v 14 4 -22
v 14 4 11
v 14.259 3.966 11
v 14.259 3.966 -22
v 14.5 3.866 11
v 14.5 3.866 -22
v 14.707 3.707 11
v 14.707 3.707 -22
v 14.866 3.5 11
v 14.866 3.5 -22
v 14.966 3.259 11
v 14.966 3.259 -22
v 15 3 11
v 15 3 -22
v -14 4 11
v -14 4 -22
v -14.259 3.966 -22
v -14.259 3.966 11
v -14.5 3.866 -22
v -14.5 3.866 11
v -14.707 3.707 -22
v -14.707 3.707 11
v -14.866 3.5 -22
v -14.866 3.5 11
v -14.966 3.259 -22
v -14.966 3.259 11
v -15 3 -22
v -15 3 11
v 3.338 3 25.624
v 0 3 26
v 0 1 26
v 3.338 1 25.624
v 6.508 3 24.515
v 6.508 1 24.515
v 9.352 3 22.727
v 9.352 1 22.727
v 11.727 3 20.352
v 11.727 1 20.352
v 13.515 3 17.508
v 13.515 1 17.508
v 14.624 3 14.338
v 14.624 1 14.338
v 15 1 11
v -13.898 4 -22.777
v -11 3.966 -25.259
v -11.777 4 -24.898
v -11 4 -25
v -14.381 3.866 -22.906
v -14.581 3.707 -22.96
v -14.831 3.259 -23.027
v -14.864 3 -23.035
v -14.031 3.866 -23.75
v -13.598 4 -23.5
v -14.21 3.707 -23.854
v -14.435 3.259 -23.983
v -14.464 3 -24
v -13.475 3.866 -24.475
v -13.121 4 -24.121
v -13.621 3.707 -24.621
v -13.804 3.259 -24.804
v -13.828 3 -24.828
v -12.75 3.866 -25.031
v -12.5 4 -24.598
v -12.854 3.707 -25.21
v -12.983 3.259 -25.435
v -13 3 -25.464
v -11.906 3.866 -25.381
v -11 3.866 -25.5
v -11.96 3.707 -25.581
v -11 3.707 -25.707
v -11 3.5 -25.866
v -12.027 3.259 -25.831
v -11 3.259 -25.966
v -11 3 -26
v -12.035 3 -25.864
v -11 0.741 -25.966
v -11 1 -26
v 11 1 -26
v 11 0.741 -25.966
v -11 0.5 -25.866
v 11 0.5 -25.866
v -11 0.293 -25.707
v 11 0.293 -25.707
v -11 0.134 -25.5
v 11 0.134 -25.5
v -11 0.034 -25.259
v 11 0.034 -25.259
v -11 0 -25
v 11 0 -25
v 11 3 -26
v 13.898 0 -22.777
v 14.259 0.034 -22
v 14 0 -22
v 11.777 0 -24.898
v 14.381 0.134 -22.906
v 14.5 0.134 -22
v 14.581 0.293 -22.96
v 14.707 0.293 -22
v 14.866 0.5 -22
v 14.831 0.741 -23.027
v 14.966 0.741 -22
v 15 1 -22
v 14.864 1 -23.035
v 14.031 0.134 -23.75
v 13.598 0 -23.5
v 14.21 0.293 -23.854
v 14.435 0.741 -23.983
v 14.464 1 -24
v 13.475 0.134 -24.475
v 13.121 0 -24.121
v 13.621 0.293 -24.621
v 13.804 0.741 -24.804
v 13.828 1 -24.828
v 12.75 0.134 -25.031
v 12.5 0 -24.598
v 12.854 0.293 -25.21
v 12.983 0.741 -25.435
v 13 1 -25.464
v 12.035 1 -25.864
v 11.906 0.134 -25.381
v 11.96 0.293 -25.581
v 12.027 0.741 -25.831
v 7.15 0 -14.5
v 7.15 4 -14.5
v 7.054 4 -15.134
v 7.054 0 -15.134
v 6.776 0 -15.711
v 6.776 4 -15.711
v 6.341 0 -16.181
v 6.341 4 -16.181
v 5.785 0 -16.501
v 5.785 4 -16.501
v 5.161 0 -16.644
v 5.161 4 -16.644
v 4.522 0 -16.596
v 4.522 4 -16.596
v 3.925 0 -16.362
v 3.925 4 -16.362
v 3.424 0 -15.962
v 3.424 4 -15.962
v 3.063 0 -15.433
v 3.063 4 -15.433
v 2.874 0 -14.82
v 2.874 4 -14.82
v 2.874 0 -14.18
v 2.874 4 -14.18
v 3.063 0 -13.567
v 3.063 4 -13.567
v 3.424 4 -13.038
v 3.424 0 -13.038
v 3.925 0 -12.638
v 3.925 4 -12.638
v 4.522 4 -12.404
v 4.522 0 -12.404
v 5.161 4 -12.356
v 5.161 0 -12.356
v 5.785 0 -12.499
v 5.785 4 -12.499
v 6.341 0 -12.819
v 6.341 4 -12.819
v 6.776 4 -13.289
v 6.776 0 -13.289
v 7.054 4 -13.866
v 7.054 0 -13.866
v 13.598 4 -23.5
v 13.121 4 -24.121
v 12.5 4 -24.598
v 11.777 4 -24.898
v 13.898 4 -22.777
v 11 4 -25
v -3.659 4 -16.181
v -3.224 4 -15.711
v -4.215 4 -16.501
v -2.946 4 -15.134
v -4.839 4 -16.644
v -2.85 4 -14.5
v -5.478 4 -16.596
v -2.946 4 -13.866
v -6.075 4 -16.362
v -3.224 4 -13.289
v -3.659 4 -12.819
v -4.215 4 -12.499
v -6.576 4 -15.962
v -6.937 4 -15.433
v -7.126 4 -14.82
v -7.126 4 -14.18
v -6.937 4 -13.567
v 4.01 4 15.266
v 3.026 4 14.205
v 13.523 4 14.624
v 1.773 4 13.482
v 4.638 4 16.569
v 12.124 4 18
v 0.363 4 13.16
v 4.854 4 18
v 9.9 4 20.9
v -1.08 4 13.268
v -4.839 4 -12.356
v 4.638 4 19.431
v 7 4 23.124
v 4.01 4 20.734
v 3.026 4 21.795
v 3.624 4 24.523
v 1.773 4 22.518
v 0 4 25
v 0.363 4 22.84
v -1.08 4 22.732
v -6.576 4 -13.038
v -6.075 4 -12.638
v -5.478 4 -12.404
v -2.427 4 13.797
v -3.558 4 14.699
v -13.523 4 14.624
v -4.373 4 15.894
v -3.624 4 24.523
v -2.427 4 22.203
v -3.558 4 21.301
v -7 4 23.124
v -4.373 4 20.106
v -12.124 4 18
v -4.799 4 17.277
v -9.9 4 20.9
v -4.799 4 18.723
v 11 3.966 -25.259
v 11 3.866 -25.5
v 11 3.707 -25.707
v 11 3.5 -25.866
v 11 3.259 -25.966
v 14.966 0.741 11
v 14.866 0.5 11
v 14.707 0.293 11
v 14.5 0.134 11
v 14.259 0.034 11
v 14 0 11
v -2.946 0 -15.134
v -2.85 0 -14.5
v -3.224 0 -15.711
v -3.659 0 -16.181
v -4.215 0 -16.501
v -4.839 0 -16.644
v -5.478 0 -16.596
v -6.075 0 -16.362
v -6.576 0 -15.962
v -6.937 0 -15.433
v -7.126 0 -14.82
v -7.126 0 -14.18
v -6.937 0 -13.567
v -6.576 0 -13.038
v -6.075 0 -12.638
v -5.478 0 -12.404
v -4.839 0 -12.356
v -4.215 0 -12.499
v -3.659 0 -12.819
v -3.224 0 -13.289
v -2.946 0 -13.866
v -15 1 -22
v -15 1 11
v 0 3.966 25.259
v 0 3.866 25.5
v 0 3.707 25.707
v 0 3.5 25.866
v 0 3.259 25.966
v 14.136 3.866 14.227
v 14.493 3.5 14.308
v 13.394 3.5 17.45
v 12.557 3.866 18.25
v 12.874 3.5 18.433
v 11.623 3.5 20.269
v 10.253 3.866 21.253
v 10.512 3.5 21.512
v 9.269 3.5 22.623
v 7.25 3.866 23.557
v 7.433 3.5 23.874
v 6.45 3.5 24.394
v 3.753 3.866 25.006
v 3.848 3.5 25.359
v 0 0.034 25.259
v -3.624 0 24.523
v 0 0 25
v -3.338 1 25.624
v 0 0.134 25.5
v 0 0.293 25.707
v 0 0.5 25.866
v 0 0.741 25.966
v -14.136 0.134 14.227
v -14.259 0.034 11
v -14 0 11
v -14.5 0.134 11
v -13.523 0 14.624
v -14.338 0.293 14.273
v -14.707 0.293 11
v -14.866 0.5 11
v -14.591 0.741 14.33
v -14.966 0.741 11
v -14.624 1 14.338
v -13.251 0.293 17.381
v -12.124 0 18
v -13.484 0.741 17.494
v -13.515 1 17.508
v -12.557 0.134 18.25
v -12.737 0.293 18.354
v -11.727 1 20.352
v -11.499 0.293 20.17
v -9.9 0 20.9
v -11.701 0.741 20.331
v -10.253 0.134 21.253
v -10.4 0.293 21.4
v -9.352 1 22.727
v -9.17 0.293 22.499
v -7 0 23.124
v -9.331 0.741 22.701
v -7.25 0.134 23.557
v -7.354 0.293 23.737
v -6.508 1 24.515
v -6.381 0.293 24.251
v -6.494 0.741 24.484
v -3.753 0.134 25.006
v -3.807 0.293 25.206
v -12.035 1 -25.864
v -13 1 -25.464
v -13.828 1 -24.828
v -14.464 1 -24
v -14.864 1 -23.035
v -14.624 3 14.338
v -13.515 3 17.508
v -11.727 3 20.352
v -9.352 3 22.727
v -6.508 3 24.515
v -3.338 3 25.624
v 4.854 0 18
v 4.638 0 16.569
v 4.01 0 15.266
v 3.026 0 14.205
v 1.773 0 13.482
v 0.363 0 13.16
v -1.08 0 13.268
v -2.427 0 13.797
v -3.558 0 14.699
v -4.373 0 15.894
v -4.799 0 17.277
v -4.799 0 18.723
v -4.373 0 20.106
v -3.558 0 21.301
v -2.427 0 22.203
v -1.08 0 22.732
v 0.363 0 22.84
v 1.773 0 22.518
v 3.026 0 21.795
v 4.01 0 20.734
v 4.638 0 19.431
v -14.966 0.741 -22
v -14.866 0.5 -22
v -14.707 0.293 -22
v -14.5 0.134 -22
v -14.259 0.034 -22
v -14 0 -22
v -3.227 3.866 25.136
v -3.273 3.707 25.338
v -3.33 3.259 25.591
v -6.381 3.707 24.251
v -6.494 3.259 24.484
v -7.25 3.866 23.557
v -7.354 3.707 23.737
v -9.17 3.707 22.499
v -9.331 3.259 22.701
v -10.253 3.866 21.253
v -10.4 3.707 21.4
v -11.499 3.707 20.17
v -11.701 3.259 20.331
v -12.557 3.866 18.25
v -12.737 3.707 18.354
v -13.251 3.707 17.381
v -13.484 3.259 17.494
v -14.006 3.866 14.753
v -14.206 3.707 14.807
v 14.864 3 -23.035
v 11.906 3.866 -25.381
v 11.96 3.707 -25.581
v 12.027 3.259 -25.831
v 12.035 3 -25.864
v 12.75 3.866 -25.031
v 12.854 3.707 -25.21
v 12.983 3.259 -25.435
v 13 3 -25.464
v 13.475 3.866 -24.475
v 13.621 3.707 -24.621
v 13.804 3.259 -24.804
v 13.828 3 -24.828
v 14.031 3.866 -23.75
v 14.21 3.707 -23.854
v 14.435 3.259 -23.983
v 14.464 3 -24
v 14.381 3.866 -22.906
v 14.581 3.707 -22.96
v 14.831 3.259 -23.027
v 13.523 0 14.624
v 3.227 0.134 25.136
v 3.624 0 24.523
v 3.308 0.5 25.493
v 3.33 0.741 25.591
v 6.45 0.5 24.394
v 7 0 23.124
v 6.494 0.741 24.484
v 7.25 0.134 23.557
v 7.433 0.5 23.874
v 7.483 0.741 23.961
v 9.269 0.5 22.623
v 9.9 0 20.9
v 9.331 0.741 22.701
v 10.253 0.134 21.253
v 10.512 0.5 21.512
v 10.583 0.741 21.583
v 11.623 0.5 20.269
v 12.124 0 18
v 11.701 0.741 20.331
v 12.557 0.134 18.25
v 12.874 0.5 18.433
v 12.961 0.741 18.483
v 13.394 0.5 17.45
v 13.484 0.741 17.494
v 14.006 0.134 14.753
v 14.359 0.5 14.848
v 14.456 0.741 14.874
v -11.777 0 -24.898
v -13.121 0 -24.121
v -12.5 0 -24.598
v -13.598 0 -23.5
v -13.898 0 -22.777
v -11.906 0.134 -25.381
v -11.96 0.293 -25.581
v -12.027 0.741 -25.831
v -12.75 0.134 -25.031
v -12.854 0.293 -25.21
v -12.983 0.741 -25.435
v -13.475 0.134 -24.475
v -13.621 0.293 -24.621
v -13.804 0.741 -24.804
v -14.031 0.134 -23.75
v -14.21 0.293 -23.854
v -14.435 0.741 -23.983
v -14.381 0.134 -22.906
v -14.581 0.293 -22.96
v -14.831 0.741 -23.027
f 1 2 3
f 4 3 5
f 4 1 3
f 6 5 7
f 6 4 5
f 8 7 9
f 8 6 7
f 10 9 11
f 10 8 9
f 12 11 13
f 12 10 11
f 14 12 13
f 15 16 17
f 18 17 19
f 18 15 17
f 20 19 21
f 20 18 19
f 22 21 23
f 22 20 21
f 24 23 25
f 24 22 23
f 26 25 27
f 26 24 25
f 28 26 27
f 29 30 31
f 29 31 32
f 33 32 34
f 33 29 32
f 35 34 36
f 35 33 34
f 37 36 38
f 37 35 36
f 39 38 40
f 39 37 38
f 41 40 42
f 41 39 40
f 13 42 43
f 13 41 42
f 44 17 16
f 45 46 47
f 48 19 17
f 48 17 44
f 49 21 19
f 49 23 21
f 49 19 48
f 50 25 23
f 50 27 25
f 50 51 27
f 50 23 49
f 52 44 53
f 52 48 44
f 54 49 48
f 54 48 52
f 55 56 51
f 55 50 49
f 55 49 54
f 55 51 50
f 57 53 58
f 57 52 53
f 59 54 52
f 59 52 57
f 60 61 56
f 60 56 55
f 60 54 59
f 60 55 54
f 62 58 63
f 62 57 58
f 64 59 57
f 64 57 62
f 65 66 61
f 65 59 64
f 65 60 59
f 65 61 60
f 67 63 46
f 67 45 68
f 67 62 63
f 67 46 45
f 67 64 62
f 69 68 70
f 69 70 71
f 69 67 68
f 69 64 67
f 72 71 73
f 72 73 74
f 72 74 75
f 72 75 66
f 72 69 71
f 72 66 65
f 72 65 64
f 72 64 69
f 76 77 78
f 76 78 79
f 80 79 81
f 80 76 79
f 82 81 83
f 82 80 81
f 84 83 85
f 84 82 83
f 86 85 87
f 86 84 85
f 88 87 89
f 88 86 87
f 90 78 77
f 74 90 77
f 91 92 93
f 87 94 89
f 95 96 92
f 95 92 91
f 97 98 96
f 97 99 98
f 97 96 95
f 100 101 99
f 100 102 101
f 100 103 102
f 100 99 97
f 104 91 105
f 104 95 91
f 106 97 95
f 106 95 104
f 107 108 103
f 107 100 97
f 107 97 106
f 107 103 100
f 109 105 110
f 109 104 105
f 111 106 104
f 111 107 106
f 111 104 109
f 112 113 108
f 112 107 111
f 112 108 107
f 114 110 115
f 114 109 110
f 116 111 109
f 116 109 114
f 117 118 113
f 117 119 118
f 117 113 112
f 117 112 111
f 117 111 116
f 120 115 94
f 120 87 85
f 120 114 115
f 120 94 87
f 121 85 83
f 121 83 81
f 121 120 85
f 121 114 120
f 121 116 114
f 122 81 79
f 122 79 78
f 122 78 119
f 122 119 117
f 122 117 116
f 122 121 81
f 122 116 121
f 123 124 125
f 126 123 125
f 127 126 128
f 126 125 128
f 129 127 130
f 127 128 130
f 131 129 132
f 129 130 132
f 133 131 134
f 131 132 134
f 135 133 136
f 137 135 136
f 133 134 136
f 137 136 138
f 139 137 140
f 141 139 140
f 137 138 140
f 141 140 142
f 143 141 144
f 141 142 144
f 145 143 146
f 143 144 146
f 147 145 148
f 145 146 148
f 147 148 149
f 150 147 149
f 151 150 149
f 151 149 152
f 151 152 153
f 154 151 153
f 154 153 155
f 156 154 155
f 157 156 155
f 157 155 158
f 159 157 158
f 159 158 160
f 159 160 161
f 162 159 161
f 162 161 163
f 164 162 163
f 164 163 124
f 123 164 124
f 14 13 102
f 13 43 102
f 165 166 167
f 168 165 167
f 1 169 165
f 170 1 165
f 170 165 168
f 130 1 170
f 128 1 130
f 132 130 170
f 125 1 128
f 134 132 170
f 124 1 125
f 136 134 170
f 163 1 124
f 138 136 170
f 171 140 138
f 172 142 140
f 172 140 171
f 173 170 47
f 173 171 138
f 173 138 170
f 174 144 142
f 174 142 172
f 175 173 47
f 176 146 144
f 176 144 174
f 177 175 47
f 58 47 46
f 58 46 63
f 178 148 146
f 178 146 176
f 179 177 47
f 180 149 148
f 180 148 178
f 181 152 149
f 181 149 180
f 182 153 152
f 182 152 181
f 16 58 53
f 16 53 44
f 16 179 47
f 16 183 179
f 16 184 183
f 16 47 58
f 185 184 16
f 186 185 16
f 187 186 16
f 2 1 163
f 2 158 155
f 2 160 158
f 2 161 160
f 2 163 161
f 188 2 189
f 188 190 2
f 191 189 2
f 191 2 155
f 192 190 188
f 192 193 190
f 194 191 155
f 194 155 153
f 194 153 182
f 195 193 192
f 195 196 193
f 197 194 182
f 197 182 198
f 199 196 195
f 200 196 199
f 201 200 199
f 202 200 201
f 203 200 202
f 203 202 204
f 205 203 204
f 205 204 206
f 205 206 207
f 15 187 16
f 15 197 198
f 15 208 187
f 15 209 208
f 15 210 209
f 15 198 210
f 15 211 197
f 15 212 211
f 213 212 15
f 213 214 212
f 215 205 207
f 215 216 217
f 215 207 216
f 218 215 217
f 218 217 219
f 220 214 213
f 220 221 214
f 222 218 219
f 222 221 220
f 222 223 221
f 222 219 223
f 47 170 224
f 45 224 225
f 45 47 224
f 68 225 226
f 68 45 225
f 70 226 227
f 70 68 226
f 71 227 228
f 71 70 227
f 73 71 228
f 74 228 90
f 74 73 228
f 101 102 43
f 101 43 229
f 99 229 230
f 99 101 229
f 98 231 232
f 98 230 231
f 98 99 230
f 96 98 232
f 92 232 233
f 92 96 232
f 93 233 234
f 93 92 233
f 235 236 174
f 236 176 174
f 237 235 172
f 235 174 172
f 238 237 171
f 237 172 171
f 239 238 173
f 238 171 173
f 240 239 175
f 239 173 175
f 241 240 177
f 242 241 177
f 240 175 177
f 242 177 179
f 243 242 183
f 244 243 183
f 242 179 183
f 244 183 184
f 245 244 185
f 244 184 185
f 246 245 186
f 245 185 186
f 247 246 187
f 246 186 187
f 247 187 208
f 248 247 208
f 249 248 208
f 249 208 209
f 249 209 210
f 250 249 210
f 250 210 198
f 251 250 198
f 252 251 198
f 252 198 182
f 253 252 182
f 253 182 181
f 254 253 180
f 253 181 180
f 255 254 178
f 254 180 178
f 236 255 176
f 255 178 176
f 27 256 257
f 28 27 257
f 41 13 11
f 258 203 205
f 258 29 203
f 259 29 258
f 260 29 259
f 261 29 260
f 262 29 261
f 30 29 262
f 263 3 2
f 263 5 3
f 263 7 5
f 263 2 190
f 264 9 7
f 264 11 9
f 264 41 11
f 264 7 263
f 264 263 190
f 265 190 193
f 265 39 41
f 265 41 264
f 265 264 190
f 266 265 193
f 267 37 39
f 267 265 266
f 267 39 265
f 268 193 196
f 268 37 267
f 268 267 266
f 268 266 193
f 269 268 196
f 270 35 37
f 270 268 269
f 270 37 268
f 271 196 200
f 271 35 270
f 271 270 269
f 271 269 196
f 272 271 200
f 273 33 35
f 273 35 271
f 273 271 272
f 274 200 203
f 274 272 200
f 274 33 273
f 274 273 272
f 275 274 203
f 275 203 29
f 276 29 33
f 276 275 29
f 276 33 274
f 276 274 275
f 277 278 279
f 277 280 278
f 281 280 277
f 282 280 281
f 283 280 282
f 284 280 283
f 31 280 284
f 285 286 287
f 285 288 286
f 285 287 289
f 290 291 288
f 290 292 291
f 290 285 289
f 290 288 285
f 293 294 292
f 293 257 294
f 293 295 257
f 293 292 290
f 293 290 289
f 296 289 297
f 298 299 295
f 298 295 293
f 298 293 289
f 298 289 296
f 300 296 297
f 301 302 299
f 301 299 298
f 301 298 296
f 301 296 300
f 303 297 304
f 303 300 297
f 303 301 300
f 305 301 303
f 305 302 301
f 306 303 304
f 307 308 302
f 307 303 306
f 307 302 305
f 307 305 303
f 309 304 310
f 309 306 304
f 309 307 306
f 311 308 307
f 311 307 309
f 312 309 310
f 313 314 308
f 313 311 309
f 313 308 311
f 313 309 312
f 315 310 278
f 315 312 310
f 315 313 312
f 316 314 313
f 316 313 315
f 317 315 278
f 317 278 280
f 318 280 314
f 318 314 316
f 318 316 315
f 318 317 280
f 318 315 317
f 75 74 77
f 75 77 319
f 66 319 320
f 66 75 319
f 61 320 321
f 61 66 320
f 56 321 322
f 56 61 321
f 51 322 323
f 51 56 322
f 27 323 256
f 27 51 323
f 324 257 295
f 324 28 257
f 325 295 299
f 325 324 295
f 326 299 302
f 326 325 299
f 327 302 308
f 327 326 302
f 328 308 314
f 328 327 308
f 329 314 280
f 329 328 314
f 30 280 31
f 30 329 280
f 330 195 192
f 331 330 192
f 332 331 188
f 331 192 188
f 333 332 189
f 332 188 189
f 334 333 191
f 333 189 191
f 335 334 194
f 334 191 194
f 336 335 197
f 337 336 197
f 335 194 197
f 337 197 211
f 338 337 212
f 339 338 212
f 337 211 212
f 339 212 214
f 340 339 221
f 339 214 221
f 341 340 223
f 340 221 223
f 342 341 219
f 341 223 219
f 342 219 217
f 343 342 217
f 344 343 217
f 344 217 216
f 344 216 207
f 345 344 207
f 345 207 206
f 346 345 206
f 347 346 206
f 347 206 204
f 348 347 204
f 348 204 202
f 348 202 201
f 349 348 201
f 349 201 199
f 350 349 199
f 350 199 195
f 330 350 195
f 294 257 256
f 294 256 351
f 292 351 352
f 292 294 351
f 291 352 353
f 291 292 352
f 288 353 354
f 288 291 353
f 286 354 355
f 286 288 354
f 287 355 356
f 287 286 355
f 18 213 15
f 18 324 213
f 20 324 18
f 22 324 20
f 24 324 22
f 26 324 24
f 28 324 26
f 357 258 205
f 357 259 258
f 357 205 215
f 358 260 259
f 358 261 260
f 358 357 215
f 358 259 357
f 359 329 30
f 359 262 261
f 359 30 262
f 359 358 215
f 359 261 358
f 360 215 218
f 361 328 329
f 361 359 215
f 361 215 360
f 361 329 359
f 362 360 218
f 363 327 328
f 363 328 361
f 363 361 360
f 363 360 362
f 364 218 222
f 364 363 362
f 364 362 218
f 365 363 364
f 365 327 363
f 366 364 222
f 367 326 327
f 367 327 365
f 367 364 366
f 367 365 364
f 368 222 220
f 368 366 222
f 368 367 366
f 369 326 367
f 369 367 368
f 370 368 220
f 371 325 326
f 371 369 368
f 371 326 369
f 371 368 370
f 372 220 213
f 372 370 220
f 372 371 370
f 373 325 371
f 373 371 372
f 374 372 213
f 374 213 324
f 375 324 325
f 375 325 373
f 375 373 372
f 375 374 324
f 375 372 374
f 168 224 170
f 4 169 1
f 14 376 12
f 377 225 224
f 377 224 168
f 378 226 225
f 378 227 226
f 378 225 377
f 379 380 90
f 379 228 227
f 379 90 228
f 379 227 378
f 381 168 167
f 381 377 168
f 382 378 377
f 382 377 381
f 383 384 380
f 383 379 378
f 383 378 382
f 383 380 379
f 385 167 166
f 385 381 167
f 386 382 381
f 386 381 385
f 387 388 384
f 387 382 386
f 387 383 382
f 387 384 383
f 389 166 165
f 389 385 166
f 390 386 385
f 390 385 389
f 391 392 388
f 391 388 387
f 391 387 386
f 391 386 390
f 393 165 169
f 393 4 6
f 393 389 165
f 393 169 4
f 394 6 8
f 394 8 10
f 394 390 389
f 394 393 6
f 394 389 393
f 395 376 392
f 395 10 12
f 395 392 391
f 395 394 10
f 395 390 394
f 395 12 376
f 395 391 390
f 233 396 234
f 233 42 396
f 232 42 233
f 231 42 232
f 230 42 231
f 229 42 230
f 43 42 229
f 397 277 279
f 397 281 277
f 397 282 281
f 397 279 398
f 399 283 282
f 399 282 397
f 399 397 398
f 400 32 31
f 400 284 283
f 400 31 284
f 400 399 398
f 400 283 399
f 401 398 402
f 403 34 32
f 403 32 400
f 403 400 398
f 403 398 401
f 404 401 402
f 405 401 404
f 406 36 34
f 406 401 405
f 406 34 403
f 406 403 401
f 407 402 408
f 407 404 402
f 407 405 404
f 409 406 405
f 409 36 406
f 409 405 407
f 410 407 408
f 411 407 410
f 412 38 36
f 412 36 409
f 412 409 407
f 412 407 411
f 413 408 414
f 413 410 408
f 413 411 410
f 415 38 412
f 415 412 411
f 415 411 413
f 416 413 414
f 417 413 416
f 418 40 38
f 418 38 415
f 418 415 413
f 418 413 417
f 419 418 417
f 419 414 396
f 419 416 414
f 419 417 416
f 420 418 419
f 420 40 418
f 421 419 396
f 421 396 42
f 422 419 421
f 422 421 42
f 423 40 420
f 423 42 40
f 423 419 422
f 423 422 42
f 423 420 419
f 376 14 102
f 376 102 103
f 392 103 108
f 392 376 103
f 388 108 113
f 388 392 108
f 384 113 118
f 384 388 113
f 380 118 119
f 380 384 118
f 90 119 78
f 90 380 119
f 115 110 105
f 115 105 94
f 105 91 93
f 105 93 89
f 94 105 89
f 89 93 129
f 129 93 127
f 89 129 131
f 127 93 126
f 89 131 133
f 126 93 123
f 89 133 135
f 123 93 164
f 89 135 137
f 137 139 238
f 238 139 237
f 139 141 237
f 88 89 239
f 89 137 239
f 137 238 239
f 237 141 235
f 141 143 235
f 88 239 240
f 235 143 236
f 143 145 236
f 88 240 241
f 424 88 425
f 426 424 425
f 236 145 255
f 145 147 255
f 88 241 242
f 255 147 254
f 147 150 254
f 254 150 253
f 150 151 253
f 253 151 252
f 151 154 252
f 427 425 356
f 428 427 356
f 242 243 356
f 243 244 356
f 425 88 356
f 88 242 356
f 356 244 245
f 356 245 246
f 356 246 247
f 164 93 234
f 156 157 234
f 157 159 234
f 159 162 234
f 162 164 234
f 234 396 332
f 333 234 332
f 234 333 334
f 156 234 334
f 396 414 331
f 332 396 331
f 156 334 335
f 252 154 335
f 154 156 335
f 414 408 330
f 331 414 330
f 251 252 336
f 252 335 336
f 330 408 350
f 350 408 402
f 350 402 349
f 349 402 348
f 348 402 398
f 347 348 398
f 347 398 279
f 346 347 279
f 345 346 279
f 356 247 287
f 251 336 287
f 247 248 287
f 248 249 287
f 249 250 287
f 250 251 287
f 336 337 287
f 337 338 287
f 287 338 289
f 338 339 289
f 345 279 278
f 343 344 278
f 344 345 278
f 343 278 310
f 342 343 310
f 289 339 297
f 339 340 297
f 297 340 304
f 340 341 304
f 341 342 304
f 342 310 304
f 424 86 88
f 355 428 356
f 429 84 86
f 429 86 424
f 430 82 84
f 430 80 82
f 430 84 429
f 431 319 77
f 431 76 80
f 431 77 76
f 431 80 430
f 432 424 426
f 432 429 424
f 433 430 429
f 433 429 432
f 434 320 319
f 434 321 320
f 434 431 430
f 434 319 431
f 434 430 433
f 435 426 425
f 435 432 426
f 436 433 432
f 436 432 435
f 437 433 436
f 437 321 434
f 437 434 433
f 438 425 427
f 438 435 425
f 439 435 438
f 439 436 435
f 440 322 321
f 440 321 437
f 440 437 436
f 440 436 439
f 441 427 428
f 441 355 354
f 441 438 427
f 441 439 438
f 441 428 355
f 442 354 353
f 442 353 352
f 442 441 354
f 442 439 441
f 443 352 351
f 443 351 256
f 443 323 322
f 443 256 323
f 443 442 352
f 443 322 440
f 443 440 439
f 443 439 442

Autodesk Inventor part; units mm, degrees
ref_plane "YZ Plane" through (0, 0, 0) normal (1, 0, 0) x (0, 1, 0)
ref_plane "XZ Plane" through (0, 0, 0) normal (0, 1, 0) x (-1, 0, 0)
sketch "Sketch2" plane through (0, 0, 0) normal (0, 1, 0) x (-1, 0, 0)
  line L0 (15, 26) -> (-15, 26)
  line L1 (-15, 26) -> (-15, -26)
  line L2 (-15, -26) -> (15, -26)
  line L3 (15, -26) -> (15, 26)
  line L4 (0, 0) -> (0, -26) construction
  line L5 (0, 0) -> (0, 26) construction
  line L6 (0, 0) -> (15, 0) construction
  line L7 (0, 0) -> (-15, 0) construction
  dimension "d45" = 30
  dimension "d46" = 52
extrude "Main Body Sketch" add sketch "Sketch2" along normal blind 4
ref_plane "Work Plane1" through (0, 4, 0) normal (0, 1, 0) x (1, 0, 0)
sketch "Sketch4" plane through (0, 4, 0) normal (0, 1, 0) x (1, 0, 0)
  circle A0 centre (0, -18) radius 4.8537
  line L0 (15, 26) -> (-15, 26) projected
  line L1 (-15, 26) -> (-15, -26) projected
  circle A1 centre (5, 14.5) radius 2.15
  circle A2 centre (-5, 14.5) radius 2.15
  line L2 (15, -26) -> (15, 26) projected
  dimension "d84" = 44
  dimension "d85" = 30
  dimension "d86" = 15
  dimension "d87" = 4.3
  dimension "d88" = 4.3
  dimension "d89" = 10
  dimension "d90" = 10
  dimension "d91" = 11.5
  dimension "d92" = 11.5
extrude "Holes Cuts" cut sketch "Sketch4" against normal up to surface (4 mm away)
fillet "Fillet12" radius 4 2 edges at (-15, 2, -26) (15, 2, -26)
fillet "Fillet12" radius 15 2 edges at (15, 2, 26) (-15, 2, 26)
fillet "Fillet13" radius 1 12 edges at (10.6066, 4, 21.6066) (15, 4, -5.5) (13.8285, 4, -24.8285) (0, 4, -26) (-13.8285, 4, -24.8285) (-15, 4, -5.5) (15, 0, -5.5) (13.8285, 0, -24.8285) (0, 0, -26) (-13.8285, 0, -24.8285) (-15, 0, -5.5) (10.6066, 0, 21.6066)
equation "\"d46\" = AH"
equation "\"AH\" = 52"
equation "\"d57\" = TMROL"
equation "\"BD\" = 4"
equation "\"TMROL\" = 45"
properties part number "Side Attatchment"
